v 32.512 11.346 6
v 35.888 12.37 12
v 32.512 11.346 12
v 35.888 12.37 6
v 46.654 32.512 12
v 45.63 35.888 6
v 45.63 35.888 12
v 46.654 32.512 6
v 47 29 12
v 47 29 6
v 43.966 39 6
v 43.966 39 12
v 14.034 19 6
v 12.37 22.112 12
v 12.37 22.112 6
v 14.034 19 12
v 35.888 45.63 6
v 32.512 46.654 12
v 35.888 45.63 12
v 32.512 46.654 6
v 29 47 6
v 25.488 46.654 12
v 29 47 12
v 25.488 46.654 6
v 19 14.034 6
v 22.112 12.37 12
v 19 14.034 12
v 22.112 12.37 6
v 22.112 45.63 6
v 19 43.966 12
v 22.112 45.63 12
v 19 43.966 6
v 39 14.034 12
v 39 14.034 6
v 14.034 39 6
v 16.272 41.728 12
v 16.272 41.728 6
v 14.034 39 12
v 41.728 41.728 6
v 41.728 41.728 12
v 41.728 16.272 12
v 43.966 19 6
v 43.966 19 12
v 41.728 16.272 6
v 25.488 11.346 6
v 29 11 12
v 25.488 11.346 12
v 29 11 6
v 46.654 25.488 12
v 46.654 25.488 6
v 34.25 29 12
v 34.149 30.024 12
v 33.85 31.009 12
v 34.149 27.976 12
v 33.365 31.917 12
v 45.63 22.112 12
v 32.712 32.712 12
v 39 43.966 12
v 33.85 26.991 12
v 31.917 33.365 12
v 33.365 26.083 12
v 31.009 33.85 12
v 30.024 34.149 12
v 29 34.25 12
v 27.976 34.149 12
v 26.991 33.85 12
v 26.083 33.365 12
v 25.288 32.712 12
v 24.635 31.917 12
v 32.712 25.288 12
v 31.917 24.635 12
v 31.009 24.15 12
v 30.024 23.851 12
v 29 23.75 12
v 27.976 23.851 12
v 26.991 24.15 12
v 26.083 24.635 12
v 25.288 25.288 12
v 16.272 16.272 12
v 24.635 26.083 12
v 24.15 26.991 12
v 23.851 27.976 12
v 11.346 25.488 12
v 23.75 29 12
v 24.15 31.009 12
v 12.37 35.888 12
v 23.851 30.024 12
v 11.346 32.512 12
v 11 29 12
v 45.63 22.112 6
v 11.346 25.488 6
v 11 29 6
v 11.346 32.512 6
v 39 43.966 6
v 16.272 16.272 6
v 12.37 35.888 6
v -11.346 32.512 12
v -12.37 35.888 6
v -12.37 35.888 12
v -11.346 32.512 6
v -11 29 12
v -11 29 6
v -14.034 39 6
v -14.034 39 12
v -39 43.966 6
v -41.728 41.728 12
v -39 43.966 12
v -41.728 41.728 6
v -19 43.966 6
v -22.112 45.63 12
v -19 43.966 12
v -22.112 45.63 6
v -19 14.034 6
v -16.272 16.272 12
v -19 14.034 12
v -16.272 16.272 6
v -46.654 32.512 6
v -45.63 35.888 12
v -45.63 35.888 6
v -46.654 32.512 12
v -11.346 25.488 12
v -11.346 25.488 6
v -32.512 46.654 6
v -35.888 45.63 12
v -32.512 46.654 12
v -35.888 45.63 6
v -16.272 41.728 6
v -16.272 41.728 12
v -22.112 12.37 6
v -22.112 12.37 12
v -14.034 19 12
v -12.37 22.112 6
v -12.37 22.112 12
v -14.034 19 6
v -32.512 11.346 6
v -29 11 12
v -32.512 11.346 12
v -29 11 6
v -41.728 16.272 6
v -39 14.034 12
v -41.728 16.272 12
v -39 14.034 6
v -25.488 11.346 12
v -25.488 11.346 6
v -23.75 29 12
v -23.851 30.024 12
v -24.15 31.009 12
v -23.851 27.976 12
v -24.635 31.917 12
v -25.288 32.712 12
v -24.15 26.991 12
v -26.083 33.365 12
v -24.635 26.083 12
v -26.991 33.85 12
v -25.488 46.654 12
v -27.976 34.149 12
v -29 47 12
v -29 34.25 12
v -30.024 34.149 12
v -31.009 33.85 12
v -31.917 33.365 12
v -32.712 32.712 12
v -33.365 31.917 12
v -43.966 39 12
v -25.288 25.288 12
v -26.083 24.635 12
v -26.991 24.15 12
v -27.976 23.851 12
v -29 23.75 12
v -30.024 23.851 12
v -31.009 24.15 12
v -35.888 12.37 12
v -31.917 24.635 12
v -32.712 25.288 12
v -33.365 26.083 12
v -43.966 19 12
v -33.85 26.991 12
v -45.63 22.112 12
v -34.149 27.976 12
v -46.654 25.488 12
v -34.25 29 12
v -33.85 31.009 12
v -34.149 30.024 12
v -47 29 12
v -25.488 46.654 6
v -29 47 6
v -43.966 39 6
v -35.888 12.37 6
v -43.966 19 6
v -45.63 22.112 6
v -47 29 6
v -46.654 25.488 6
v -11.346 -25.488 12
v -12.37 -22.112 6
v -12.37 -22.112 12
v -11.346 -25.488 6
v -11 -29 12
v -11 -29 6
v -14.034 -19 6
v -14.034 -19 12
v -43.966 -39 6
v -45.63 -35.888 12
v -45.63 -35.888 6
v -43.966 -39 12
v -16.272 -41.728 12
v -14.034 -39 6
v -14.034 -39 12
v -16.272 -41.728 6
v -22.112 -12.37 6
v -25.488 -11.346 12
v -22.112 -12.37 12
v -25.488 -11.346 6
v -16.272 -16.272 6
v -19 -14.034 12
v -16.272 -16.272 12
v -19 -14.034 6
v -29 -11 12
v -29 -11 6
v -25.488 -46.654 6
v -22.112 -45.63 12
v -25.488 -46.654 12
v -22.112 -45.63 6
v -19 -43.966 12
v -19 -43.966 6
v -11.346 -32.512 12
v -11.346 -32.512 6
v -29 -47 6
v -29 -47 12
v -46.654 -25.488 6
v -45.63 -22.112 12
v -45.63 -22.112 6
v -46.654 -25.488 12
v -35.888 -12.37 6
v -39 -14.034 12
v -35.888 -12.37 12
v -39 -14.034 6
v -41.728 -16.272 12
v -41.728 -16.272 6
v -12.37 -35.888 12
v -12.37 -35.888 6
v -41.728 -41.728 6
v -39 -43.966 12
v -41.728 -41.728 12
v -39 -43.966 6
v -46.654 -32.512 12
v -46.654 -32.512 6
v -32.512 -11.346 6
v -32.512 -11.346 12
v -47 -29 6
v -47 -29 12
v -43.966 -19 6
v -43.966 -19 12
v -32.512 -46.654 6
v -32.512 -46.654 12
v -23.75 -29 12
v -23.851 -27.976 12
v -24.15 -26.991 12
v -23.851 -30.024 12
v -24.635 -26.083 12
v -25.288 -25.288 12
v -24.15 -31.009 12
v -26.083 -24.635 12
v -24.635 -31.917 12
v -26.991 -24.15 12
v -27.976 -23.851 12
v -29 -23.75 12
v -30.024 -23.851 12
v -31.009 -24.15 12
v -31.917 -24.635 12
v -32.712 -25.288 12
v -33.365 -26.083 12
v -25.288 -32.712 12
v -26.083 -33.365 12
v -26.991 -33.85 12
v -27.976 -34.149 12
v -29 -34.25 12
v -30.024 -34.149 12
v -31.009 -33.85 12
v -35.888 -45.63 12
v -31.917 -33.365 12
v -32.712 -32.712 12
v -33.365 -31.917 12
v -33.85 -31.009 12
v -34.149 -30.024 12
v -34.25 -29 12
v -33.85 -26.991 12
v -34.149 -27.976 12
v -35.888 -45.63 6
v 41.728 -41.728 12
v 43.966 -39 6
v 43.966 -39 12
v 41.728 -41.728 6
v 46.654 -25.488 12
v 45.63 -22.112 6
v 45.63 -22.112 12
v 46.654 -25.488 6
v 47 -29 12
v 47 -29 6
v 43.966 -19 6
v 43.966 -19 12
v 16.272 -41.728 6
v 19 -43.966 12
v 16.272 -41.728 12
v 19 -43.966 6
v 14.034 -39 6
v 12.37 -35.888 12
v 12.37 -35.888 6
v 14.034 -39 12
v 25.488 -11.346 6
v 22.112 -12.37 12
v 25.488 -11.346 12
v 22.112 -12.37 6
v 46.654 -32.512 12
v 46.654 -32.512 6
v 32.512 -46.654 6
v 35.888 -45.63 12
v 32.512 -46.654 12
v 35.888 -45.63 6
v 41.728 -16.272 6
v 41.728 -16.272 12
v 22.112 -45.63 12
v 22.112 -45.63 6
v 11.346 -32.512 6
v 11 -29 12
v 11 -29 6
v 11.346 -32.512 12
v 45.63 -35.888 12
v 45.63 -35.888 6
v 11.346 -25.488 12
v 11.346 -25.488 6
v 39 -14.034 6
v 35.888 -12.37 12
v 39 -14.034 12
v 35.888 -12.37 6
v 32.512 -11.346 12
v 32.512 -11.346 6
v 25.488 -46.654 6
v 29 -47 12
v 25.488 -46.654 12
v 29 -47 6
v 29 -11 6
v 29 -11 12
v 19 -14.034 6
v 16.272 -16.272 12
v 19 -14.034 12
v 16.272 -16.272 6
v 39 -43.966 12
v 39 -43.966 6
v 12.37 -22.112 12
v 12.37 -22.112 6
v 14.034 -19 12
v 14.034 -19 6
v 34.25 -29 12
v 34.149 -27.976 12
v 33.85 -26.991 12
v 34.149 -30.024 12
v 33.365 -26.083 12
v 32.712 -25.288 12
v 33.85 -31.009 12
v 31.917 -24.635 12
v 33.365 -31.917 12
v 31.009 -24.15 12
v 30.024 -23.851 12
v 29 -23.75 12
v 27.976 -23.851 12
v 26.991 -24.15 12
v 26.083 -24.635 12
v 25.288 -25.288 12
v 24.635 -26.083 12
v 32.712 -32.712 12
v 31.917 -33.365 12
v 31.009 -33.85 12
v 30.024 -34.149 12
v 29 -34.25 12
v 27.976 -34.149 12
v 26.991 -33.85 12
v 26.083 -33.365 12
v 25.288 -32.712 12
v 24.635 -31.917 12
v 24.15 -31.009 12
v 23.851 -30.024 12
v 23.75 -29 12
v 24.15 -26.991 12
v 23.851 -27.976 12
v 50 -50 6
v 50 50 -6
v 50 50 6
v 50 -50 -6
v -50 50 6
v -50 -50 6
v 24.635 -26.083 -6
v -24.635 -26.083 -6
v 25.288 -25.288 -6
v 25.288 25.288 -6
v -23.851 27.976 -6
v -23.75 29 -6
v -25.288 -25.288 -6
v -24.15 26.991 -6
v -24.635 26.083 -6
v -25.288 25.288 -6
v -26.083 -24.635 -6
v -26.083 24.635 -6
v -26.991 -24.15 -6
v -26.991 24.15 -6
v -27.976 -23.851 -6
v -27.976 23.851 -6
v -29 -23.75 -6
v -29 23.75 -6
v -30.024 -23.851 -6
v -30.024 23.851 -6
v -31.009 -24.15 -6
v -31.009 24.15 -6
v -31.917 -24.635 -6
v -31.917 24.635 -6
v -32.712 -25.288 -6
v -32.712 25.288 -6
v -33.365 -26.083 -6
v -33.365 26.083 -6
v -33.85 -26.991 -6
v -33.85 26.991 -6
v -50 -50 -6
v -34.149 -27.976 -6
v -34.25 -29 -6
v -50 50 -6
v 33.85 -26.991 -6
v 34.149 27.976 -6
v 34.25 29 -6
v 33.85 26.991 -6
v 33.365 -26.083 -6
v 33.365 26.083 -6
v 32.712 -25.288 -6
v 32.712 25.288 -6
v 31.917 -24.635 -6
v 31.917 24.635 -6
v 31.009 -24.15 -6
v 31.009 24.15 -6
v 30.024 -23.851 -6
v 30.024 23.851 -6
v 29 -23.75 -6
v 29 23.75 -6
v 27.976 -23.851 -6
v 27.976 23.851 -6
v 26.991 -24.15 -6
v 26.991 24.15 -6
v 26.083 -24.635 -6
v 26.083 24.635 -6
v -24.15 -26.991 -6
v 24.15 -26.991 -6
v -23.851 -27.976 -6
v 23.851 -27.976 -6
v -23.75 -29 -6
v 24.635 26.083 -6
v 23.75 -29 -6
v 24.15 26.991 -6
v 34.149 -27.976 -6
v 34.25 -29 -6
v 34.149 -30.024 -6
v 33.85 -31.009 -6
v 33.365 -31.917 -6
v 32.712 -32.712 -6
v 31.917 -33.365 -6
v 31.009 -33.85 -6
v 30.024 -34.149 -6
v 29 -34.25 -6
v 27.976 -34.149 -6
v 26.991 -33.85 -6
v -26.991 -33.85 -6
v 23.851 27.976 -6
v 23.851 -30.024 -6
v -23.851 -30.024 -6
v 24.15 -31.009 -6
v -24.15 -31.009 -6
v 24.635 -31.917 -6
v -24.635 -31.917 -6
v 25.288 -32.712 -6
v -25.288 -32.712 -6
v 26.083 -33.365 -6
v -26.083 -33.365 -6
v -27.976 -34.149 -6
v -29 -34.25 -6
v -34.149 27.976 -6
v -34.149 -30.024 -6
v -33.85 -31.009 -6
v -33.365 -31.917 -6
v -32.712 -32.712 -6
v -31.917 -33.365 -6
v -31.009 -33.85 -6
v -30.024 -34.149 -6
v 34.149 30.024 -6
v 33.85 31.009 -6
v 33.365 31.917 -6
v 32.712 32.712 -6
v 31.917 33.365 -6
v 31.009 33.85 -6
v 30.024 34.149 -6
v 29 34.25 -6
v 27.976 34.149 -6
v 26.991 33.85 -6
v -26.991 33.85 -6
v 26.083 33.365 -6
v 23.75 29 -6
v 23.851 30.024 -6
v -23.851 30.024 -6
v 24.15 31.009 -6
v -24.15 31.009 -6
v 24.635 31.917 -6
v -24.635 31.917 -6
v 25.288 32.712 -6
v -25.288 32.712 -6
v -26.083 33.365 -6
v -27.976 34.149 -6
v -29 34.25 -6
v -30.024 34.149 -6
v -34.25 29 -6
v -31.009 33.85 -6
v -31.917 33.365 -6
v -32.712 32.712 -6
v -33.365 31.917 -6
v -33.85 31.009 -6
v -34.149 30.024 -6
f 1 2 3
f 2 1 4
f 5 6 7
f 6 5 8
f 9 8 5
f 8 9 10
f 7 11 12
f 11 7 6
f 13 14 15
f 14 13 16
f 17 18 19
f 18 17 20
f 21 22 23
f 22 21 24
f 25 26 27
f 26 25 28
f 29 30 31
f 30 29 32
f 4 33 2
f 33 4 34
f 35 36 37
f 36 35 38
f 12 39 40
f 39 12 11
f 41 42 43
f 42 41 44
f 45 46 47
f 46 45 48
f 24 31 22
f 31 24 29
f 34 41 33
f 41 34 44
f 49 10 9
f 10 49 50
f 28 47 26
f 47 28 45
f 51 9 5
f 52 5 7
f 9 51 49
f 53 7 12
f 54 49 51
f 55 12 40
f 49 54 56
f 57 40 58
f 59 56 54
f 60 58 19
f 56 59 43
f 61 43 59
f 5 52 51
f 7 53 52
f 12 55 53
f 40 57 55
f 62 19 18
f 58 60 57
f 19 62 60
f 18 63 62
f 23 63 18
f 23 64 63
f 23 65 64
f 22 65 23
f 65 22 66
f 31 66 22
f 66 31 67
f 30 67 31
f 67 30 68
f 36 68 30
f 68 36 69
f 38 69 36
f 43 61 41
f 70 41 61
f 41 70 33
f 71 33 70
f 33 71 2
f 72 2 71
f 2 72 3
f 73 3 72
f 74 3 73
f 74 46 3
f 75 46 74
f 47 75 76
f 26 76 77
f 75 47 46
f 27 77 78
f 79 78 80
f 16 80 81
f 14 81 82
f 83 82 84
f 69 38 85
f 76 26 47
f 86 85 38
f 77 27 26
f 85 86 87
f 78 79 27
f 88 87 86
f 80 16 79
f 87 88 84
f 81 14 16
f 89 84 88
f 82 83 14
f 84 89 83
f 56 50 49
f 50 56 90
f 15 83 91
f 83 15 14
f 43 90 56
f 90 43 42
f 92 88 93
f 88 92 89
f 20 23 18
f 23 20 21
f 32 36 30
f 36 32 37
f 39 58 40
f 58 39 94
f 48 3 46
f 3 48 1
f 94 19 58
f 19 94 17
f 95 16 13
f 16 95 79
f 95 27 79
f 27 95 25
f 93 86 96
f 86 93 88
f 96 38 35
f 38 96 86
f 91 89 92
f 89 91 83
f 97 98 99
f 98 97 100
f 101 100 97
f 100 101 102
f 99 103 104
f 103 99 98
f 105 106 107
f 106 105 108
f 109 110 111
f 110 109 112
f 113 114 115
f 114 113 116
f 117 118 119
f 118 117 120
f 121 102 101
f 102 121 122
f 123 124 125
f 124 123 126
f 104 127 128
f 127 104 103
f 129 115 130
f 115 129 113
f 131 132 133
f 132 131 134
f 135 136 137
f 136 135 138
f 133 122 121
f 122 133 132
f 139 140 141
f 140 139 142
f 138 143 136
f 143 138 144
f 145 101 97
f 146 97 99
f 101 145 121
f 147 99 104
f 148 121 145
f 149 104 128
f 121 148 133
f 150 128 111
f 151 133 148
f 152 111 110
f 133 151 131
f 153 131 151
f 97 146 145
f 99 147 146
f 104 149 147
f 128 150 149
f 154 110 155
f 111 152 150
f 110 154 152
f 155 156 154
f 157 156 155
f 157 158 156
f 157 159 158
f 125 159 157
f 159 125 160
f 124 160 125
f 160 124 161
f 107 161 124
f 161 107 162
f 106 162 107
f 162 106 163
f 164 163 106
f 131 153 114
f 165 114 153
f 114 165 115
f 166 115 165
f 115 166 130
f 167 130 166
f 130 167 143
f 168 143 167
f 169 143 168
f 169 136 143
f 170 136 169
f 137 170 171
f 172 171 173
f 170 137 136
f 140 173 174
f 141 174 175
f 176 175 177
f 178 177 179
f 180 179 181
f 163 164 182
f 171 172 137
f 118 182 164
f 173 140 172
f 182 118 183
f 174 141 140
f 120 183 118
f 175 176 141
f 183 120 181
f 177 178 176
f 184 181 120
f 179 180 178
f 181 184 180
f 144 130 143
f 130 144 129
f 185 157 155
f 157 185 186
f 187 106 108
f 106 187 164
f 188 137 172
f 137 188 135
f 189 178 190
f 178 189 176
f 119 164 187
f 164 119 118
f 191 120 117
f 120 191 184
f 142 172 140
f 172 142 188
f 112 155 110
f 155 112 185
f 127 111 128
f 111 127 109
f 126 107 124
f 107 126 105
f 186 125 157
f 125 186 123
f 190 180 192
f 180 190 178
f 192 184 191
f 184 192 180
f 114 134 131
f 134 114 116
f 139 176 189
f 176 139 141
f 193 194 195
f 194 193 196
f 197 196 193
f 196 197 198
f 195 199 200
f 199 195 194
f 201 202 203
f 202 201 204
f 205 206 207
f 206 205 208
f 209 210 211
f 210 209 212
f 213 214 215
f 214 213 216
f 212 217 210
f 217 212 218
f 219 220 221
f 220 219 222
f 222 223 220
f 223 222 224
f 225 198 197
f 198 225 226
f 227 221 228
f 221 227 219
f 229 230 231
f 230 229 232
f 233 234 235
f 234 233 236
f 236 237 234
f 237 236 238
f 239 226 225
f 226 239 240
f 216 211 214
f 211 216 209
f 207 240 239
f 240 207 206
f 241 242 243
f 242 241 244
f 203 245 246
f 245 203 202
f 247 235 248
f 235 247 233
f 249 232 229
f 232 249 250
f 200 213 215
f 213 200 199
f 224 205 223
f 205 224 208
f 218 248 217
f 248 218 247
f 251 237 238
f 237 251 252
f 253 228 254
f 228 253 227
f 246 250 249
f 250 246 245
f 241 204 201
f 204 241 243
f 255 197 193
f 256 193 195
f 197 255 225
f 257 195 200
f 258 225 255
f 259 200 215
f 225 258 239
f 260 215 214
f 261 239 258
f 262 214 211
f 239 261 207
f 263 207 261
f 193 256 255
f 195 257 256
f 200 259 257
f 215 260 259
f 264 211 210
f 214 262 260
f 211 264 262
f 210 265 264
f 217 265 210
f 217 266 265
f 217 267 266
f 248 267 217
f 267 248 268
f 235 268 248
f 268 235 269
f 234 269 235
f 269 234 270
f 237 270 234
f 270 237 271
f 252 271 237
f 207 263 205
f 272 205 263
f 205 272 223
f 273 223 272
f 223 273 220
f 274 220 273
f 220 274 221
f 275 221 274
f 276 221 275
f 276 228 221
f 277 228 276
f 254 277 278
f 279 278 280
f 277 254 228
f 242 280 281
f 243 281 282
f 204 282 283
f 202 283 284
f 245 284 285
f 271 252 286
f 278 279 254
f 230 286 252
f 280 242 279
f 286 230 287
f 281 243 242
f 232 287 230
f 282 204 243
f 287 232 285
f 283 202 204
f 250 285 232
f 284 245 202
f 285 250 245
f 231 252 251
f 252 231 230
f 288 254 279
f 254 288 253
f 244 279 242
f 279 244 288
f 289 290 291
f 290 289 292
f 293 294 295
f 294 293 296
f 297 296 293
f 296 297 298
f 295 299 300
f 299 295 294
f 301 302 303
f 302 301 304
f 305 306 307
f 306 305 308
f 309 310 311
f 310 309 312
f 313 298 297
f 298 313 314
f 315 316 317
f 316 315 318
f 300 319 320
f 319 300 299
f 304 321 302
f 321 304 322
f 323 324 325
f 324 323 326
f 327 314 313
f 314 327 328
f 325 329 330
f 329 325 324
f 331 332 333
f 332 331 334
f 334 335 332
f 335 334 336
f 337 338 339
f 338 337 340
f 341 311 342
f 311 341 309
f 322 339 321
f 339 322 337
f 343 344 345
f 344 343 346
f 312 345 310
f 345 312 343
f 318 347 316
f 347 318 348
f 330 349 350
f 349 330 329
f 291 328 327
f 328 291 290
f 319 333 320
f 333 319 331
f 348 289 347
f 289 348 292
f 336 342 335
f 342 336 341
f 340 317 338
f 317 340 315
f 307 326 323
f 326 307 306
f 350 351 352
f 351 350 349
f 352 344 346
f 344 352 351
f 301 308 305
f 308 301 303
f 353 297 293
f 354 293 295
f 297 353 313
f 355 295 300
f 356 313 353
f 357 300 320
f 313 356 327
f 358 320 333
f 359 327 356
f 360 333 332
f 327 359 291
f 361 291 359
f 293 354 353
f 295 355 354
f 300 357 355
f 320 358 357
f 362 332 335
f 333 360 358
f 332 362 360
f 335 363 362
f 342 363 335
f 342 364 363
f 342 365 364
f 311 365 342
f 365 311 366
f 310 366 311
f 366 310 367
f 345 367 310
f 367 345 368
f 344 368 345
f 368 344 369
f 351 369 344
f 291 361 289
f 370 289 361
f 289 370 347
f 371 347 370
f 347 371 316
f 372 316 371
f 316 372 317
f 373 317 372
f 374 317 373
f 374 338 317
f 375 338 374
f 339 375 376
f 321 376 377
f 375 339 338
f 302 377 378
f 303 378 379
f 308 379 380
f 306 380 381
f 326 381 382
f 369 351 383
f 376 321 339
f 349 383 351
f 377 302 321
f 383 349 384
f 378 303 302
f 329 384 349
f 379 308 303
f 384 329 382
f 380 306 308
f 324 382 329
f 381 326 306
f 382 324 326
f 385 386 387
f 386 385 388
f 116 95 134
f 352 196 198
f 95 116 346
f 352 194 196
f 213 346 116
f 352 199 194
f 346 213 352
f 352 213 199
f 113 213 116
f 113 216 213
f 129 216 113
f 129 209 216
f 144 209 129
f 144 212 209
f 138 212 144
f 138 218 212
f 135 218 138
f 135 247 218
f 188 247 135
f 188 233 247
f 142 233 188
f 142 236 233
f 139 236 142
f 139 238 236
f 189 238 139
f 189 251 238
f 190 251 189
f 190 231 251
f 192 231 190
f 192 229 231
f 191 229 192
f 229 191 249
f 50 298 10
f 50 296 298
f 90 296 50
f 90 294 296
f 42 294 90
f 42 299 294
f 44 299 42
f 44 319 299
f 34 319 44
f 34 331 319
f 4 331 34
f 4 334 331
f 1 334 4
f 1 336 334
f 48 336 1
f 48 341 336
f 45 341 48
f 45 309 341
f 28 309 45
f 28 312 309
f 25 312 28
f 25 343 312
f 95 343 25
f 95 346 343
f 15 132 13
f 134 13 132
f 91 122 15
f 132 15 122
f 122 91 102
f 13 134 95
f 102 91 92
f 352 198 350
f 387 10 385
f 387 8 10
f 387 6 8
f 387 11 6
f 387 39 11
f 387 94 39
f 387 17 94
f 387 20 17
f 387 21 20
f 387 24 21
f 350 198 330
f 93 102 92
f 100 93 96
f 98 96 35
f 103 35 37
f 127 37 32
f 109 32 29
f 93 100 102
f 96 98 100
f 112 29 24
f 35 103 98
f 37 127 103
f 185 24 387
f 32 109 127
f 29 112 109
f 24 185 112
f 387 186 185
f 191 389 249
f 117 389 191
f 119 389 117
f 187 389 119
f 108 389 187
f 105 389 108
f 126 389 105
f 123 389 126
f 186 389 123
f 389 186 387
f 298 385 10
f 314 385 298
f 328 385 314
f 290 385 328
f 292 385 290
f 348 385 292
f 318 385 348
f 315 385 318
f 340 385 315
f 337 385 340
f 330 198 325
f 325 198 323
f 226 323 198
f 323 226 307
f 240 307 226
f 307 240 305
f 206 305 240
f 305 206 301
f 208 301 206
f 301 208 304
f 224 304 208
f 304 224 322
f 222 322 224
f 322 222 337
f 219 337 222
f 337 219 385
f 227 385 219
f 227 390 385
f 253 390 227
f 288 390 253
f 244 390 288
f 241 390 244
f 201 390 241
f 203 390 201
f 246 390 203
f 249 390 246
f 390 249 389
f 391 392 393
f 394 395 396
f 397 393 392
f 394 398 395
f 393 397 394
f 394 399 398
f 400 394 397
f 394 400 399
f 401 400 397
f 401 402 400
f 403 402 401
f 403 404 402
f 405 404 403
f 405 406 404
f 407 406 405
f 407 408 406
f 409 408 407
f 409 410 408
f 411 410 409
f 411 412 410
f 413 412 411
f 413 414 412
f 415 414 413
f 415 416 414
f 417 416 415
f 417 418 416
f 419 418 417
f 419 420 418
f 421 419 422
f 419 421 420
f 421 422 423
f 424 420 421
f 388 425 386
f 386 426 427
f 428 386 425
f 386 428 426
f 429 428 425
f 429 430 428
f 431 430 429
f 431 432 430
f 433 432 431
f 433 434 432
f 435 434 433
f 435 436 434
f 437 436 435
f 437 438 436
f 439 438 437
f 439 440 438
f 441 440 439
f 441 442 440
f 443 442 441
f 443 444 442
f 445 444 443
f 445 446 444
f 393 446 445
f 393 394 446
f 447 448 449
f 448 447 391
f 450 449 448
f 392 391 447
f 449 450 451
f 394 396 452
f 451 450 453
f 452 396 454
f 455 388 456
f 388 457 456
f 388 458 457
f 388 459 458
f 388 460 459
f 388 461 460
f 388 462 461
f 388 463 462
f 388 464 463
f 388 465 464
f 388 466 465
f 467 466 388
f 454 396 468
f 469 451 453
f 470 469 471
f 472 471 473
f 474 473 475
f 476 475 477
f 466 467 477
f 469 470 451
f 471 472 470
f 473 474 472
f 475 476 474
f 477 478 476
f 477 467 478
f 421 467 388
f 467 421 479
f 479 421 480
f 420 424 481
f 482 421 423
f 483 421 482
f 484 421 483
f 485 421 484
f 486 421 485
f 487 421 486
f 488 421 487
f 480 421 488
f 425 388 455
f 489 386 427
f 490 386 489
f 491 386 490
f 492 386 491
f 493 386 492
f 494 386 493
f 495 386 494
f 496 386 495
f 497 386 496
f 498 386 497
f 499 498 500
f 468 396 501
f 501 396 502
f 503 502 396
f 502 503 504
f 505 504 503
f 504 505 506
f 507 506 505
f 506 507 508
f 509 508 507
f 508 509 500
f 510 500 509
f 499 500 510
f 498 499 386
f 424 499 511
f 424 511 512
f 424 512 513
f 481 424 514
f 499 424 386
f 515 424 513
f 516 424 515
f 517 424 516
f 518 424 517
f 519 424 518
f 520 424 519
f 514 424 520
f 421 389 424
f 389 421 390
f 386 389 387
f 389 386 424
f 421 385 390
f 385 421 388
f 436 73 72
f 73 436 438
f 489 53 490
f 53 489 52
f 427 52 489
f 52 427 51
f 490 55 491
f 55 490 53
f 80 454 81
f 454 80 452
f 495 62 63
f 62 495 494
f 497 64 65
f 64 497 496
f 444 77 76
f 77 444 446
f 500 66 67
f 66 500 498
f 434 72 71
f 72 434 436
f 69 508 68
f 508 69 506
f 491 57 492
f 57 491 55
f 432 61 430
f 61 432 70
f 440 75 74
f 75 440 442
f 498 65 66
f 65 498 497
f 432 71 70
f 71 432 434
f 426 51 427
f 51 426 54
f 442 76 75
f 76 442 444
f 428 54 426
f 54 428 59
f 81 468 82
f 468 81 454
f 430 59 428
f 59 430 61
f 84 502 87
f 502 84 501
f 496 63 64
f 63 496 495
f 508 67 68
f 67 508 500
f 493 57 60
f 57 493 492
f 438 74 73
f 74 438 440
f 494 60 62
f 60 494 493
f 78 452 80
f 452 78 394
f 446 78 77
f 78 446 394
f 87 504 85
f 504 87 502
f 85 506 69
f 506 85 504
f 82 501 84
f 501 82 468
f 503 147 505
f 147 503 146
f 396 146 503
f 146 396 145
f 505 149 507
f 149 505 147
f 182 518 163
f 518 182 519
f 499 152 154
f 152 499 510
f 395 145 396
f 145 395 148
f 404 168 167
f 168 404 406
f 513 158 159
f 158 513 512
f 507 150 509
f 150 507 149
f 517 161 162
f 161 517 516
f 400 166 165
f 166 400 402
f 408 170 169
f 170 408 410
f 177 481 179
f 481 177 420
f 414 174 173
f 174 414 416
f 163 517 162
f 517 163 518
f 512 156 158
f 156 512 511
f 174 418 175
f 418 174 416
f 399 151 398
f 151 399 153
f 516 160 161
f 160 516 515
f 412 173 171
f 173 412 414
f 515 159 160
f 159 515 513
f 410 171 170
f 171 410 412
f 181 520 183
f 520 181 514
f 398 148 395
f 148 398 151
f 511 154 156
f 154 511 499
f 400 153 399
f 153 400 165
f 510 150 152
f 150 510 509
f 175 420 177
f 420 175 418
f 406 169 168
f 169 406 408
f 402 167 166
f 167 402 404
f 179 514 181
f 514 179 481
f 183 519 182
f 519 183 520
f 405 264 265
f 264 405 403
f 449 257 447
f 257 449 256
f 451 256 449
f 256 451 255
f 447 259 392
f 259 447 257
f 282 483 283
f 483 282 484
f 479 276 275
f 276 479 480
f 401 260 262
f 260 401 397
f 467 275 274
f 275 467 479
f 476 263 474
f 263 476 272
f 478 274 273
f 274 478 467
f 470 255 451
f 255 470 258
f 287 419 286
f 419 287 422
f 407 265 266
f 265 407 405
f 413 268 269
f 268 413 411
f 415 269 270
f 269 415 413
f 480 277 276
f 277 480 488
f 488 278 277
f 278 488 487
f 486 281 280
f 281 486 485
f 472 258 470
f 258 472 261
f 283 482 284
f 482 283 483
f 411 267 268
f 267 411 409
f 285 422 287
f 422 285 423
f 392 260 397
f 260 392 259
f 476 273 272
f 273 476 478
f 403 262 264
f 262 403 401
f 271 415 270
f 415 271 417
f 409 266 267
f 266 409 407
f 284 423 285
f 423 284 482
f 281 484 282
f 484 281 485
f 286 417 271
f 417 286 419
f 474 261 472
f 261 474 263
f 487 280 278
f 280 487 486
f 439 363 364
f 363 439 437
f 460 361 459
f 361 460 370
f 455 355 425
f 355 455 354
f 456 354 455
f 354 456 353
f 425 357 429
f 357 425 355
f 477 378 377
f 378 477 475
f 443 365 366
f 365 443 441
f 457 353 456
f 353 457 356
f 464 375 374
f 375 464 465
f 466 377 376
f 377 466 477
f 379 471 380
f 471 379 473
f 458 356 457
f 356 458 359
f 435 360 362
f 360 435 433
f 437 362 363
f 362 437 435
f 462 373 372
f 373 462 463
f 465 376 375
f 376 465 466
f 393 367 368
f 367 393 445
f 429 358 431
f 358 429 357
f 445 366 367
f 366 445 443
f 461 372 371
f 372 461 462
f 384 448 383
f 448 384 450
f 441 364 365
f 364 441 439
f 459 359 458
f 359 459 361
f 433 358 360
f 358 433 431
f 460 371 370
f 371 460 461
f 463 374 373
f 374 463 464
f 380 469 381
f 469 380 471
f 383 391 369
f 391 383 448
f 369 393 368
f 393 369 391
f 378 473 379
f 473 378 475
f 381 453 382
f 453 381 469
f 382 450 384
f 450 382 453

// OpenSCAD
$fn = 32;

// ----------------------------------------------------------------------
// Anchor pads 100 x 100 x 18
// four corner bosses with anchor holes
// ----------------------------------------------------------------------

// --- parameters (mm) ---
plate = [100, 100, 12];  // base plate size (x, y, z)
pads = 4;                // boss count, one per corner
edge = 21;               // boss centre offset from the plate edge
boss_d = 36;             // boss diameter
boss_h = 6;              // boss height above the base plate
hole_d = 10.5;           // hole diameter

// --- derived feature positions (mm) ---
height = plate[2] + boss_h;      // = 18   overall height of the part
corner_x = plate[0] / 2 - edge;  // = 29   boss centre X
corner_y = plate[1] / 2 - edge;  // = 29   boss centre Y
feature_centers = [
  [corner_x, corner_y],
  [-corner_x, corner_y],
  [-corner_x, -corner_y],
  [corner_x, -corner_y]
];   // boss centres, anchor holes are drilled there

// base plate, four bosses standing on it, anchor holes all the way through
difference() {
  union() {
    cube(plate, center = true);
    for (centre = feature_centers)
      translate([centre[0], centre[1], plate[2] / 2 - 1])
        cylinder(d = boss_d, h = boss_h + 1);
  }
  for (centre = feature_centers)
    translate([centre[0], centre[1], -height])
      cylinder(d = hole_d, h = 2 * height + 2);  // through boss and plate
}
